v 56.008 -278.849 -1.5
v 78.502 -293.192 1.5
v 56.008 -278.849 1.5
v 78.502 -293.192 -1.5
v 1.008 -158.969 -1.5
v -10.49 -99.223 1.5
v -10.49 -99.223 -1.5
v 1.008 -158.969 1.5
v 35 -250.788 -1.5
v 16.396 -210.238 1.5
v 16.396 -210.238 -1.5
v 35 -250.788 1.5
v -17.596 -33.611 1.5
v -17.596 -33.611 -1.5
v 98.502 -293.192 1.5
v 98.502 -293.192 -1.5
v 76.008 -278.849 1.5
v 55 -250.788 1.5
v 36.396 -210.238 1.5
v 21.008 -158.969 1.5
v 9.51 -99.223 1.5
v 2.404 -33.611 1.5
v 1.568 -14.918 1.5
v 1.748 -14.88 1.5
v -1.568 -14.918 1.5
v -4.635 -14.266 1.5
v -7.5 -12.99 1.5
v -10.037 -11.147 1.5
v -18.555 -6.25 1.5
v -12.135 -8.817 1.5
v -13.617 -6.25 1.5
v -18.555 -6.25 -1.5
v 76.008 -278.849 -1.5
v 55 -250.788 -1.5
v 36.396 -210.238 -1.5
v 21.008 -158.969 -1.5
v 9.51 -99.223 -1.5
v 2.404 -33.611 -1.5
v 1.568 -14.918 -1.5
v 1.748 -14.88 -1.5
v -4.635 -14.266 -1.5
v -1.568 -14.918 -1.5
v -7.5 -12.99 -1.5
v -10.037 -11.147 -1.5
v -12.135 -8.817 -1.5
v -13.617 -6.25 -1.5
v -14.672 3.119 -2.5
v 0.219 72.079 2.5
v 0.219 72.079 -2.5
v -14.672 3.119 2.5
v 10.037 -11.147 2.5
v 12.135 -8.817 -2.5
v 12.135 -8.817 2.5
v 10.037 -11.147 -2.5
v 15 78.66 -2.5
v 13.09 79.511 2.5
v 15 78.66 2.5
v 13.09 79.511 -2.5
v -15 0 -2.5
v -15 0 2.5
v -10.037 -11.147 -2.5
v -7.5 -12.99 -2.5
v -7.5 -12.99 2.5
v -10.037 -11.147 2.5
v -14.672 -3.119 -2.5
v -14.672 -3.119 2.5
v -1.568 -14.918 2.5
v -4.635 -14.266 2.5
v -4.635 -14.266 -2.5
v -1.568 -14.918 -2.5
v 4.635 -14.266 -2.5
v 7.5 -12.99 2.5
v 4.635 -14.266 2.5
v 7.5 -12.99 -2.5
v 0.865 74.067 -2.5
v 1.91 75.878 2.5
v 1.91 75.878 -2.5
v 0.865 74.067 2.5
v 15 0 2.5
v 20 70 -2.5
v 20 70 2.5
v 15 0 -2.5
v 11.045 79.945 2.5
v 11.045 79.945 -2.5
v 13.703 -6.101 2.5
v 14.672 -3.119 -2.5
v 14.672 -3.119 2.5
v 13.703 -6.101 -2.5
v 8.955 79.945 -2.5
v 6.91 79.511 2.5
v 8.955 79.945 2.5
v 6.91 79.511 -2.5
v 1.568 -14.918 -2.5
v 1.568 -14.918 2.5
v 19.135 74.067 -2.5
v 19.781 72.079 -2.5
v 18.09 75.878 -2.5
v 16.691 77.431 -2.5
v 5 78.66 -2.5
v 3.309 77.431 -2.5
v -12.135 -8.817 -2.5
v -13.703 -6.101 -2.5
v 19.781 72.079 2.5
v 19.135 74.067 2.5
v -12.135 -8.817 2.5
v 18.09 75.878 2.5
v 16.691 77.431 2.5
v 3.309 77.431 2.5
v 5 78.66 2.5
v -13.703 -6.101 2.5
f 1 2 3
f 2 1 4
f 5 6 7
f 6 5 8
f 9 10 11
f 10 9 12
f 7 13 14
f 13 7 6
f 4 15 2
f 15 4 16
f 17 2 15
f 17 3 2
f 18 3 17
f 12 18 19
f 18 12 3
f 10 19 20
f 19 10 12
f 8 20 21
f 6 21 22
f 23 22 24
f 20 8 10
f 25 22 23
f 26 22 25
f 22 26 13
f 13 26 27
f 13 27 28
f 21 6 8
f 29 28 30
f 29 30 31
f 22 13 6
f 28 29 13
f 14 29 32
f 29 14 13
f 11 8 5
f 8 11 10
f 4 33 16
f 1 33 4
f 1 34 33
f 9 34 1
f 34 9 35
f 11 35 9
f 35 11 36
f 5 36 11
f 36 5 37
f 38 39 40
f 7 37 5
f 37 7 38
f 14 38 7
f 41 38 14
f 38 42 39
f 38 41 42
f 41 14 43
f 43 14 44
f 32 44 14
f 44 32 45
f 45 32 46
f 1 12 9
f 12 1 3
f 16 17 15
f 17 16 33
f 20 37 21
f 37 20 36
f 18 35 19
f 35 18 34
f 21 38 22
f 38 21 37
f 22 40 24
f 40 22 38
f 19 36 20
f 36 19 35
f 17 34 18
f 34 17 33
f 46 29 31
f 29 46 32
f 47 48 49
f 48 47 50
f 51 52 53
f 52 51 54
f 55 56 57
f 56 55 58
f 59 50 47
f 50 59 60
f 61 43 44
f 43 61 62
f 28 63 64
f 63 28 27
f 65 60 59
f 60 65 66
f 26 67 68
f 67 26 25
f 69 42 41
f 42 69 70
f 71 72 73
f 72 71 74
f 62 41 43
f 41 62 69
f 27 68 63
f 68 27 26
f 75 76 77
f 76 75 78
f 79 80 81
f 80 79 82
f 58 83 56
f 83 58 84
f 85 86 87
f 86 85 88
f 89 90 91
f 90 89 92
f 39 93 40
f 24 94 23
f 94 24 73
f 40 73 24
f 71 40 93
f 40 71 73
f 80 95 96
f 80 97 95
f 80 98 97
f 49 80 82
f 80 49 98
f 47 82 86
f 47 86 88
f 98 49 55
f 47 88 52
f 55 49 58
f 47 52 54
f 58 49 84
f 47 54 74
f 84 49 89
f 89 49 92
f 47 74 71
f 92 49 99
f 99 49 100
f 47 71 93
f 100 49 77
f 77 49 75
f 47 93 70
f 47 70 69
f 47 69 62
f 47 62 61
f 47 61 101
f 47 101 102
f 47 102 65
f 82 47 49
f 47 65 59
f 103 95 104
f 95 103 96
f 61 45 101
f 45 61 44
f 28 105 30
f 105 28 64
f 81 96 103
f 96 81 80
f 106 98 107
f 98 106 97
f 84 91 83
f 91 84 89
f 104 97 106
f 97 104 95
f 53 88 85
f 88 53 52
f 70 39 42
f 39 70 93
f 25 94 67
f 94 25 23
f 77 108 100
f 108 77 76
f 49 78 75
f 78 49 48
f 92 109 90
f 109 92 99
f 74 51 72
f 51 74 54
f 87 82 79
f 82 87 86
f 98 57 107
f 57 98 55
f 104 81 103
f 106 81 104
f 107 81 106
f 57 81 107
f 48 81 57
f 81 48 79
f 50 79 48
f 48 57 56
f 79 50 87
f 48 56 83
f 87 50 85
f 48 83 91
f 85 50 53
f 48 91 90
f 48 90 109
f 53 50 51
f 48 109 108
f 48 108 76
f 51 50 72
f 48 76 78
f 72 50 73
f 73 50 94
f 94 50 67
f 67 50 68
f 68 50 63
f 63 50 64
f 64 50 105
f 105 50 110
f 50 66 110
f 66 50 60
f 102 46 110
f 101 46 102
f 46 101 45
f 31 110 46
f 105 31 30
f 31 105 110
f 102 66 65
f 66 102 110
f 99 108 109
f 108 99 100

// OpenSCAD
//
// knife
//

// variables
blade_height = 3;
handle_height = 5;
base_dia = 15;
tip_dia = 10;
base_tip_offset = 10;
handle_length = 70;
blade_length=55;
blade_offset=20;

module handle() {
	hull() {
		cylinder(h=handle_height, r=base_dia, center=true);
		translate([base_tip_offset,  handle_length,0])
		cylinder(h=handle_height, r=tip_dia, center=true);
	}
}

module blade() {
	translate([blade_length + blade_offset + base_dia ,handle_length/2,0])
	scale([1,3,1])
	difference() {
		cylinder(r=blade_length*2, h=blade_height, center=true);
		translate([blade_offset,0,0])
		cylinder(r=blade_length*2, h=blade_height + 1, center=true);

		translate([-blade_length,blade_length,0])
		cube(blade_length * 2.5, center=true);
	}
}

module main() {
	handle();
	blade();
}

main();
